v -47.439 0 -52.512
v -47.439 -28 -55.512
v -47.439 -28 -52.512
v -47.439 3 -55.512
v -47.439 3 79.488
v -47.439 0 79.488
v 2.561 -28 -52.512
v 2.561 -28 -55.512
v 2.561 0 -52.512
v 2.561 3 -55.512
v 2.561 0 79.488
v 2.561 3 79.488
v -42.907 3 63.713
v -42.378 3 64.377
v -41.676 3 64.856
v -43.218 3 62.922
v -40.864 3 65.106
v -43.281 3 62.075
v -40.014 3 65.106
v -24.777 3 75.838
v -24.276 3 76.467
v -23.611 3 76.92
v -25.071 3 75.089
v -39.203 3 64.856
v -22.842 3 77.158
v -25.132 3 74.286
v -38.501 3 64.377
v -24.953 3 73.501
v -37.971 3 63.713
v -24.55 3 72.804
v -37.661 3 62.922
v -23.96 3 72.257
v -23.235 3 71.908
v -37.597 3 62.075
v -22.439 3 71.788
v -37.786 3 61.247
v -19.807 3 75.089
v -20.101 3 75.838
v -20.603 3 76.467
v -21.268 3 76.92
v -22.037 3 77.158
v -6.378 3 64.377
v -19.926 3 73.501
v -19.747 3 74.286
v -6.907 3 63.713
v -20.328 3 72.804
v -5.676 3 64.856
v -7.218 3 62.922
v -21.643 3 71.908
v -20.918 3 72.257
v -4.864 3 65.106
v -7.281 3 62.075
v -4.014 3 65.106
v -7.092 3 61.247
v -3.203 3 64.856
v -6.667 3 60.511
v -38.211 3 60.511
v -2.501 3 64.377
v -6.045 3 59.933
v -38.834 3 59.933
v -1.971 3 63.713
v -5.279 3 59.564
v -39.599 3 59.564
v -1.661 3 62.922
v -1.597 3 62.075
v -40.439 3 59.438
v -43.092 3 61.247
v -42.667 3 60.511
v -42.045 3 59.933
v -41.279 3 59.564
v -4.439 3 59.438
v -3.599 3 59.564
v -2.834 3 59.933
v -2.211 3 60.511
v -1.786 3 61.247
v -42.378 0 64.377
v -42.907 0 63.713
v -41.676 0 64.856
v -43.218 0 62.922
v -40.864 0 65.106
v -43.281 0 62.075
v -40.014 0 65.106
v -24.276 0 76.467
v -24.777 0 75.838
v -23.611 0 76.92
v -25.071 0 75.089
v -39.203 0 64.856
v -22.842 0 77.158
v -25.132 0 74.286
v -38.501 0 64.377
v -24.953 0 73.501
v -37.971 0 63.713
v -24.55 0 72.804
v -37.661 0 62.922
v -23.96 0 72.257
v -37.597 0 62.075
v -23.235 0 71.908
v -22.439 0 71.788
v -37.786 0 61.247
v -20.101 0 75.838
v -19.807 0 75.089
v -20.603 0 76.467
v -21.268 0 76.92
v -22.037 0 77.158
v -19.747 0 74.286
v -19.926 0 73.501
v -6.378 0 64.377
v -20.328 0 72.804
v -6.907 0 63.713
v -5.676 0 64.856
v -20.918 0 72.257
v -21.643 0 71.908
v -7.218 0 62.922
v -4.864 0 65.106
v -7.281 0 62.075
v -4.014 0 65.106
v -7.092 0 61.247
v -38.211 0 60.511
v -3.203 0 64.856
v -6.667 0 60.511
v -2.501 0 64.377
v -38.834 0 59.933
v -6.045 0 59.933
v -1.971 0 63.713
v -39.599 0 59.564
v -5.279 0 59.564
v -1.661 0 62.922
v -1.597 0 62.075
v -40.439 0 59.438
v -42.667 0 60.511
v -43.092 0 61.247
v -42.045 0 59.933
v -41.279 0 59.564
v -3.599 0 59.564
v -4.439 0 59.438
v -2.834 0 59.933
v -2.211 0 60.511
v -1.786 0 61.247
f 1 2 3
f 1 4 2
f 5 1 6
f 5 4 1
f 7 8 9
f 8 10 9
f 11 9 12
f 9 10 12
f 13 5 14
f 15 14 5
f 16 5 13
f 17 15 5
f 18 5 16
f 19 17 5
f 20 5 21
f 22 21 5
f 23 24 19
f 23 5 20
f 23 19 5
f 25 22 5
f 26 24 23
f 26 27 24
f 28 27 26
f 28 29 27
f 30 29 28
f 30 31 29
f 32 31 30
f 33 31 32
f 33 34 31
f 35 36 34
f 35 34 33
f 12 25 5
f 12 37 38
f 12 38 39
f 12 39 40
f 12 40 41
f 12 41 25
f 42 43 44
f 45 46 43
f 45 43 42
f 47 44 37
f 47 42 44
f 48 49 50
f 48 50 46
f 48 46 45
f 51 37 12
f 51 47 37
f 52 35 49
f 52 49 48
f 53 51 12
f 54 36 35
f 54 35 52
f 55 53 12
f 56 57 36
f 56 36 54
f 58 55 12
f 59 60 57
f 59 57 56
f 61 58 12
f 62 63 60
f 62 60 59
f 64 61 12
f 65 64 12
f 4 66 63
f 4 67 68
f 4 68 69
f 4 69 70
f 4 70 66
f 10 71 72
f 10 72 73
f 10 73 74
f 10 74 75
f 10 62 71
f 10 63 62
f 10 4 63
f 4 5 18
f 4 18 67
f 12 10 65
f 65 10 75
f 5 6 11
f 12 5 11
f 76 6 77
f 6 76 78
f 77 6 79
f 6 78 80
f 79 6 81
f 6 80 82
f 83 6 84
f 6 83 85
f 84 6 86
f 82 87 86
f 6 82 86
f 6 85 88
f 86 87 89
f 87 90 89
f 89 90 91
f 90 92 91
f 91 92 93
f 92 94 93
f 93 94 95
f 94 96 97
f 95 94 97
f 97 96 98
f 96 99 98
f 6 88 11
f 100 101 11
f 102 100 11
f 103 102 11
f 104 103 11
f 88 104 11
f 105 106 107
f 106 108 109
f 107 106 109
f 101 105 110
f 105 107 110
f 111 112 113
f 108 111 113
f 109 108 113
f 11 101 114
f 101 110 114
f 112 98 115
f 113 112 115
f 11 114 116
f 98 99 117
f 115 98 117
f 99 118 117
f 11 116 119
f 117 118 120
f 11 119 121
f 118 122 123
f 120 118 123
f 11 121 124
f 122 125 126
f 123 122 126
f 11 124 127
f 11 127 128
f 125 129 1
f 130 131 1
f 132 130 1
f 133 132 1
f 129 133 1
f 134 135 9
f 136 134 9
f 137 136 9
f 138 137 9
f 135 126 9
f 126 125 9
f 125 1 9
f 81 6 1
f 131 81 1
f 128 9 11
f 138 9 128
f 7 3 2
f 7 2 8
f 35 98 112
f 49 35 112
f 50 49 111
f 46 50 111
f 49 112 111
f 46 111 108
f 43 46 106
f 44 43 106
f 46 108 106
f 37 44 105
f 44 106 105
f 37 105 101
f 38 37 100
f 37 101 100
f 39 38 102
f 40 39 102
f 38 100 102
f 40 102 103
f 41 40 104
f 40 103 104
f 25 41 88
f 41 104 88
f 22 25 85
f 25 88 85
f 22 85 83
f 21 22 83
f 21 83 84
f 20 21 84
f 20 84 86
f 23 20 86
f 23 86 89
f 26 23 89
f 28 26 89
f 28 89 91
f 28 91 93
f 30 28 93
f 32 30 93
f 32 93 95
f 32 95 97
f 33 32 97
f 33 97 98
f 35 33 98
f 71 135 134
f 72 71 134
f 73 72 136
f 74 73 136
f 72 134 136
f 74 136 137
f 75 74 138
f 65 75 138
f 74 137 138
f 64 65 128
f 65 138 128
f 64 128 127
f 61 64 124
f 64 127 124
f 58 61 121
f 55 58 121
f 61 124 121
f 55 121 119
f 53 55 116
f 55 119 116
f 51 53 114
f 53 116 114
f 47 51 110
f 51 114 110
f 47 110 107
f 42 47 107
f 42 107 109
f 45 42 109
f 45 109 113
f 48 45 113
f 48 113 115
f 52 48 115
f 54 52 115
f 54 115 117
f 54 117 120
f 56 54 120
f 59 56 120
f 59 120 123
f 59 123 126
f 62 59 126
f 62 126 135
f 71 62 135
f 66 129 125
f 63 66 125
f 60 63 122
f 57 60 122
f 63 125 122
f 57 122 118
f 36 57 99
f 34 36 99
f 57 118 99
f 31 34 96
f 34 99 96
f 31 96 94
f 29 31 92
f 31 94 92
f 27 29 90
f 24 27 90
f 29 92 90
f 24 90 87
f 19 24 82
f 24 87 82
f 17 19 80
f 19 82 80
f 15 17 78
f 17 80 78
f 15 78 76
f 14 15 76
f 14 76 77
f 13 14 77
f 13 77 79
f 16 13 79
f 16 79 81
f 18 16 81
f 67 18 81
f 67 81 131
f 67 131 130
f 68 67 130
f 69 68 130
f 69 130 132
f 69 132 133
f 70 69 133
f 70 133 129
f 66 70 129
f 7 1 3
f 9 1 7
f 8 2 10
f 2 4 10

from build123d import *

# Parameters (mm, degrees)
SKETCH1_W           = 50
SKETCH1_H           = 135
BOSS_EXTRUDE1_DEPTH = 3
SKETCH2_W           = 50
SKETCH2_H           = 3
BOSS_EXTRUDE2_DEPTH = 28
SKETCH3_R           = 2.7
CUT_EXTRUDE1_DEPTH  = 90
SKETCH5_R           = 2.85
CUT_EXTRUDE2_DEPTH  = 90


with BuildPart() as part:
    # Sketch1 → Boss-Extrude1 (new body)
    with BuildSketch(Plane(origin=(0, 0, 0), x_dir=(1, 0, 0), z_dir=(0, 1, 0))):
        with Locations((-22.439180538, -11.987836108)):
            Rectangle(SKETCH1_W, SKETCH1_H)
    extrude(amount=BOSS_EXTRUDE1_DEPTH)

    # Sketch2 → Boss-Extrude2 (add)
    with BuildSketch(Plane.XZ):
        with Locations((-22.439180538, -54.012163892)):
            Rectangle(SKETCH2_W, SKETCH2_H)
    extrude(amount=BOSS_EXTRUDE2_DEPTH)

    # Sketch3 → Cut-Extrude1 (cut)
    with BuildSketch(Plane.XZ):
        with Locations(Location((-22.439180538, 74.487836108, 0), (0, 0, 270))):
            Circle(SKETCH3_R)
    extrude(amount=-CUT_EXTRUDE1_DEPTH, mode=Mode.SUBTRACT)

    # Sketch5 → Cut-Extrude2 (cut)
    with BuildSketch(Plane.XZ):
        with Locations(Location((-40.439180538, 62.287836108, 0), (0, 0, 270))):
            Circle(SKETCH5_R)
        with Locations(Location((-4.439180538, 62.287836108, 0), (0, 0, 270))):
            Circle(SKETCH5_R)
    extrude(amount=-CUT_EXTRUDE2_DEPTH, mode=Mode.SUBTRACT)


solid = part.part
